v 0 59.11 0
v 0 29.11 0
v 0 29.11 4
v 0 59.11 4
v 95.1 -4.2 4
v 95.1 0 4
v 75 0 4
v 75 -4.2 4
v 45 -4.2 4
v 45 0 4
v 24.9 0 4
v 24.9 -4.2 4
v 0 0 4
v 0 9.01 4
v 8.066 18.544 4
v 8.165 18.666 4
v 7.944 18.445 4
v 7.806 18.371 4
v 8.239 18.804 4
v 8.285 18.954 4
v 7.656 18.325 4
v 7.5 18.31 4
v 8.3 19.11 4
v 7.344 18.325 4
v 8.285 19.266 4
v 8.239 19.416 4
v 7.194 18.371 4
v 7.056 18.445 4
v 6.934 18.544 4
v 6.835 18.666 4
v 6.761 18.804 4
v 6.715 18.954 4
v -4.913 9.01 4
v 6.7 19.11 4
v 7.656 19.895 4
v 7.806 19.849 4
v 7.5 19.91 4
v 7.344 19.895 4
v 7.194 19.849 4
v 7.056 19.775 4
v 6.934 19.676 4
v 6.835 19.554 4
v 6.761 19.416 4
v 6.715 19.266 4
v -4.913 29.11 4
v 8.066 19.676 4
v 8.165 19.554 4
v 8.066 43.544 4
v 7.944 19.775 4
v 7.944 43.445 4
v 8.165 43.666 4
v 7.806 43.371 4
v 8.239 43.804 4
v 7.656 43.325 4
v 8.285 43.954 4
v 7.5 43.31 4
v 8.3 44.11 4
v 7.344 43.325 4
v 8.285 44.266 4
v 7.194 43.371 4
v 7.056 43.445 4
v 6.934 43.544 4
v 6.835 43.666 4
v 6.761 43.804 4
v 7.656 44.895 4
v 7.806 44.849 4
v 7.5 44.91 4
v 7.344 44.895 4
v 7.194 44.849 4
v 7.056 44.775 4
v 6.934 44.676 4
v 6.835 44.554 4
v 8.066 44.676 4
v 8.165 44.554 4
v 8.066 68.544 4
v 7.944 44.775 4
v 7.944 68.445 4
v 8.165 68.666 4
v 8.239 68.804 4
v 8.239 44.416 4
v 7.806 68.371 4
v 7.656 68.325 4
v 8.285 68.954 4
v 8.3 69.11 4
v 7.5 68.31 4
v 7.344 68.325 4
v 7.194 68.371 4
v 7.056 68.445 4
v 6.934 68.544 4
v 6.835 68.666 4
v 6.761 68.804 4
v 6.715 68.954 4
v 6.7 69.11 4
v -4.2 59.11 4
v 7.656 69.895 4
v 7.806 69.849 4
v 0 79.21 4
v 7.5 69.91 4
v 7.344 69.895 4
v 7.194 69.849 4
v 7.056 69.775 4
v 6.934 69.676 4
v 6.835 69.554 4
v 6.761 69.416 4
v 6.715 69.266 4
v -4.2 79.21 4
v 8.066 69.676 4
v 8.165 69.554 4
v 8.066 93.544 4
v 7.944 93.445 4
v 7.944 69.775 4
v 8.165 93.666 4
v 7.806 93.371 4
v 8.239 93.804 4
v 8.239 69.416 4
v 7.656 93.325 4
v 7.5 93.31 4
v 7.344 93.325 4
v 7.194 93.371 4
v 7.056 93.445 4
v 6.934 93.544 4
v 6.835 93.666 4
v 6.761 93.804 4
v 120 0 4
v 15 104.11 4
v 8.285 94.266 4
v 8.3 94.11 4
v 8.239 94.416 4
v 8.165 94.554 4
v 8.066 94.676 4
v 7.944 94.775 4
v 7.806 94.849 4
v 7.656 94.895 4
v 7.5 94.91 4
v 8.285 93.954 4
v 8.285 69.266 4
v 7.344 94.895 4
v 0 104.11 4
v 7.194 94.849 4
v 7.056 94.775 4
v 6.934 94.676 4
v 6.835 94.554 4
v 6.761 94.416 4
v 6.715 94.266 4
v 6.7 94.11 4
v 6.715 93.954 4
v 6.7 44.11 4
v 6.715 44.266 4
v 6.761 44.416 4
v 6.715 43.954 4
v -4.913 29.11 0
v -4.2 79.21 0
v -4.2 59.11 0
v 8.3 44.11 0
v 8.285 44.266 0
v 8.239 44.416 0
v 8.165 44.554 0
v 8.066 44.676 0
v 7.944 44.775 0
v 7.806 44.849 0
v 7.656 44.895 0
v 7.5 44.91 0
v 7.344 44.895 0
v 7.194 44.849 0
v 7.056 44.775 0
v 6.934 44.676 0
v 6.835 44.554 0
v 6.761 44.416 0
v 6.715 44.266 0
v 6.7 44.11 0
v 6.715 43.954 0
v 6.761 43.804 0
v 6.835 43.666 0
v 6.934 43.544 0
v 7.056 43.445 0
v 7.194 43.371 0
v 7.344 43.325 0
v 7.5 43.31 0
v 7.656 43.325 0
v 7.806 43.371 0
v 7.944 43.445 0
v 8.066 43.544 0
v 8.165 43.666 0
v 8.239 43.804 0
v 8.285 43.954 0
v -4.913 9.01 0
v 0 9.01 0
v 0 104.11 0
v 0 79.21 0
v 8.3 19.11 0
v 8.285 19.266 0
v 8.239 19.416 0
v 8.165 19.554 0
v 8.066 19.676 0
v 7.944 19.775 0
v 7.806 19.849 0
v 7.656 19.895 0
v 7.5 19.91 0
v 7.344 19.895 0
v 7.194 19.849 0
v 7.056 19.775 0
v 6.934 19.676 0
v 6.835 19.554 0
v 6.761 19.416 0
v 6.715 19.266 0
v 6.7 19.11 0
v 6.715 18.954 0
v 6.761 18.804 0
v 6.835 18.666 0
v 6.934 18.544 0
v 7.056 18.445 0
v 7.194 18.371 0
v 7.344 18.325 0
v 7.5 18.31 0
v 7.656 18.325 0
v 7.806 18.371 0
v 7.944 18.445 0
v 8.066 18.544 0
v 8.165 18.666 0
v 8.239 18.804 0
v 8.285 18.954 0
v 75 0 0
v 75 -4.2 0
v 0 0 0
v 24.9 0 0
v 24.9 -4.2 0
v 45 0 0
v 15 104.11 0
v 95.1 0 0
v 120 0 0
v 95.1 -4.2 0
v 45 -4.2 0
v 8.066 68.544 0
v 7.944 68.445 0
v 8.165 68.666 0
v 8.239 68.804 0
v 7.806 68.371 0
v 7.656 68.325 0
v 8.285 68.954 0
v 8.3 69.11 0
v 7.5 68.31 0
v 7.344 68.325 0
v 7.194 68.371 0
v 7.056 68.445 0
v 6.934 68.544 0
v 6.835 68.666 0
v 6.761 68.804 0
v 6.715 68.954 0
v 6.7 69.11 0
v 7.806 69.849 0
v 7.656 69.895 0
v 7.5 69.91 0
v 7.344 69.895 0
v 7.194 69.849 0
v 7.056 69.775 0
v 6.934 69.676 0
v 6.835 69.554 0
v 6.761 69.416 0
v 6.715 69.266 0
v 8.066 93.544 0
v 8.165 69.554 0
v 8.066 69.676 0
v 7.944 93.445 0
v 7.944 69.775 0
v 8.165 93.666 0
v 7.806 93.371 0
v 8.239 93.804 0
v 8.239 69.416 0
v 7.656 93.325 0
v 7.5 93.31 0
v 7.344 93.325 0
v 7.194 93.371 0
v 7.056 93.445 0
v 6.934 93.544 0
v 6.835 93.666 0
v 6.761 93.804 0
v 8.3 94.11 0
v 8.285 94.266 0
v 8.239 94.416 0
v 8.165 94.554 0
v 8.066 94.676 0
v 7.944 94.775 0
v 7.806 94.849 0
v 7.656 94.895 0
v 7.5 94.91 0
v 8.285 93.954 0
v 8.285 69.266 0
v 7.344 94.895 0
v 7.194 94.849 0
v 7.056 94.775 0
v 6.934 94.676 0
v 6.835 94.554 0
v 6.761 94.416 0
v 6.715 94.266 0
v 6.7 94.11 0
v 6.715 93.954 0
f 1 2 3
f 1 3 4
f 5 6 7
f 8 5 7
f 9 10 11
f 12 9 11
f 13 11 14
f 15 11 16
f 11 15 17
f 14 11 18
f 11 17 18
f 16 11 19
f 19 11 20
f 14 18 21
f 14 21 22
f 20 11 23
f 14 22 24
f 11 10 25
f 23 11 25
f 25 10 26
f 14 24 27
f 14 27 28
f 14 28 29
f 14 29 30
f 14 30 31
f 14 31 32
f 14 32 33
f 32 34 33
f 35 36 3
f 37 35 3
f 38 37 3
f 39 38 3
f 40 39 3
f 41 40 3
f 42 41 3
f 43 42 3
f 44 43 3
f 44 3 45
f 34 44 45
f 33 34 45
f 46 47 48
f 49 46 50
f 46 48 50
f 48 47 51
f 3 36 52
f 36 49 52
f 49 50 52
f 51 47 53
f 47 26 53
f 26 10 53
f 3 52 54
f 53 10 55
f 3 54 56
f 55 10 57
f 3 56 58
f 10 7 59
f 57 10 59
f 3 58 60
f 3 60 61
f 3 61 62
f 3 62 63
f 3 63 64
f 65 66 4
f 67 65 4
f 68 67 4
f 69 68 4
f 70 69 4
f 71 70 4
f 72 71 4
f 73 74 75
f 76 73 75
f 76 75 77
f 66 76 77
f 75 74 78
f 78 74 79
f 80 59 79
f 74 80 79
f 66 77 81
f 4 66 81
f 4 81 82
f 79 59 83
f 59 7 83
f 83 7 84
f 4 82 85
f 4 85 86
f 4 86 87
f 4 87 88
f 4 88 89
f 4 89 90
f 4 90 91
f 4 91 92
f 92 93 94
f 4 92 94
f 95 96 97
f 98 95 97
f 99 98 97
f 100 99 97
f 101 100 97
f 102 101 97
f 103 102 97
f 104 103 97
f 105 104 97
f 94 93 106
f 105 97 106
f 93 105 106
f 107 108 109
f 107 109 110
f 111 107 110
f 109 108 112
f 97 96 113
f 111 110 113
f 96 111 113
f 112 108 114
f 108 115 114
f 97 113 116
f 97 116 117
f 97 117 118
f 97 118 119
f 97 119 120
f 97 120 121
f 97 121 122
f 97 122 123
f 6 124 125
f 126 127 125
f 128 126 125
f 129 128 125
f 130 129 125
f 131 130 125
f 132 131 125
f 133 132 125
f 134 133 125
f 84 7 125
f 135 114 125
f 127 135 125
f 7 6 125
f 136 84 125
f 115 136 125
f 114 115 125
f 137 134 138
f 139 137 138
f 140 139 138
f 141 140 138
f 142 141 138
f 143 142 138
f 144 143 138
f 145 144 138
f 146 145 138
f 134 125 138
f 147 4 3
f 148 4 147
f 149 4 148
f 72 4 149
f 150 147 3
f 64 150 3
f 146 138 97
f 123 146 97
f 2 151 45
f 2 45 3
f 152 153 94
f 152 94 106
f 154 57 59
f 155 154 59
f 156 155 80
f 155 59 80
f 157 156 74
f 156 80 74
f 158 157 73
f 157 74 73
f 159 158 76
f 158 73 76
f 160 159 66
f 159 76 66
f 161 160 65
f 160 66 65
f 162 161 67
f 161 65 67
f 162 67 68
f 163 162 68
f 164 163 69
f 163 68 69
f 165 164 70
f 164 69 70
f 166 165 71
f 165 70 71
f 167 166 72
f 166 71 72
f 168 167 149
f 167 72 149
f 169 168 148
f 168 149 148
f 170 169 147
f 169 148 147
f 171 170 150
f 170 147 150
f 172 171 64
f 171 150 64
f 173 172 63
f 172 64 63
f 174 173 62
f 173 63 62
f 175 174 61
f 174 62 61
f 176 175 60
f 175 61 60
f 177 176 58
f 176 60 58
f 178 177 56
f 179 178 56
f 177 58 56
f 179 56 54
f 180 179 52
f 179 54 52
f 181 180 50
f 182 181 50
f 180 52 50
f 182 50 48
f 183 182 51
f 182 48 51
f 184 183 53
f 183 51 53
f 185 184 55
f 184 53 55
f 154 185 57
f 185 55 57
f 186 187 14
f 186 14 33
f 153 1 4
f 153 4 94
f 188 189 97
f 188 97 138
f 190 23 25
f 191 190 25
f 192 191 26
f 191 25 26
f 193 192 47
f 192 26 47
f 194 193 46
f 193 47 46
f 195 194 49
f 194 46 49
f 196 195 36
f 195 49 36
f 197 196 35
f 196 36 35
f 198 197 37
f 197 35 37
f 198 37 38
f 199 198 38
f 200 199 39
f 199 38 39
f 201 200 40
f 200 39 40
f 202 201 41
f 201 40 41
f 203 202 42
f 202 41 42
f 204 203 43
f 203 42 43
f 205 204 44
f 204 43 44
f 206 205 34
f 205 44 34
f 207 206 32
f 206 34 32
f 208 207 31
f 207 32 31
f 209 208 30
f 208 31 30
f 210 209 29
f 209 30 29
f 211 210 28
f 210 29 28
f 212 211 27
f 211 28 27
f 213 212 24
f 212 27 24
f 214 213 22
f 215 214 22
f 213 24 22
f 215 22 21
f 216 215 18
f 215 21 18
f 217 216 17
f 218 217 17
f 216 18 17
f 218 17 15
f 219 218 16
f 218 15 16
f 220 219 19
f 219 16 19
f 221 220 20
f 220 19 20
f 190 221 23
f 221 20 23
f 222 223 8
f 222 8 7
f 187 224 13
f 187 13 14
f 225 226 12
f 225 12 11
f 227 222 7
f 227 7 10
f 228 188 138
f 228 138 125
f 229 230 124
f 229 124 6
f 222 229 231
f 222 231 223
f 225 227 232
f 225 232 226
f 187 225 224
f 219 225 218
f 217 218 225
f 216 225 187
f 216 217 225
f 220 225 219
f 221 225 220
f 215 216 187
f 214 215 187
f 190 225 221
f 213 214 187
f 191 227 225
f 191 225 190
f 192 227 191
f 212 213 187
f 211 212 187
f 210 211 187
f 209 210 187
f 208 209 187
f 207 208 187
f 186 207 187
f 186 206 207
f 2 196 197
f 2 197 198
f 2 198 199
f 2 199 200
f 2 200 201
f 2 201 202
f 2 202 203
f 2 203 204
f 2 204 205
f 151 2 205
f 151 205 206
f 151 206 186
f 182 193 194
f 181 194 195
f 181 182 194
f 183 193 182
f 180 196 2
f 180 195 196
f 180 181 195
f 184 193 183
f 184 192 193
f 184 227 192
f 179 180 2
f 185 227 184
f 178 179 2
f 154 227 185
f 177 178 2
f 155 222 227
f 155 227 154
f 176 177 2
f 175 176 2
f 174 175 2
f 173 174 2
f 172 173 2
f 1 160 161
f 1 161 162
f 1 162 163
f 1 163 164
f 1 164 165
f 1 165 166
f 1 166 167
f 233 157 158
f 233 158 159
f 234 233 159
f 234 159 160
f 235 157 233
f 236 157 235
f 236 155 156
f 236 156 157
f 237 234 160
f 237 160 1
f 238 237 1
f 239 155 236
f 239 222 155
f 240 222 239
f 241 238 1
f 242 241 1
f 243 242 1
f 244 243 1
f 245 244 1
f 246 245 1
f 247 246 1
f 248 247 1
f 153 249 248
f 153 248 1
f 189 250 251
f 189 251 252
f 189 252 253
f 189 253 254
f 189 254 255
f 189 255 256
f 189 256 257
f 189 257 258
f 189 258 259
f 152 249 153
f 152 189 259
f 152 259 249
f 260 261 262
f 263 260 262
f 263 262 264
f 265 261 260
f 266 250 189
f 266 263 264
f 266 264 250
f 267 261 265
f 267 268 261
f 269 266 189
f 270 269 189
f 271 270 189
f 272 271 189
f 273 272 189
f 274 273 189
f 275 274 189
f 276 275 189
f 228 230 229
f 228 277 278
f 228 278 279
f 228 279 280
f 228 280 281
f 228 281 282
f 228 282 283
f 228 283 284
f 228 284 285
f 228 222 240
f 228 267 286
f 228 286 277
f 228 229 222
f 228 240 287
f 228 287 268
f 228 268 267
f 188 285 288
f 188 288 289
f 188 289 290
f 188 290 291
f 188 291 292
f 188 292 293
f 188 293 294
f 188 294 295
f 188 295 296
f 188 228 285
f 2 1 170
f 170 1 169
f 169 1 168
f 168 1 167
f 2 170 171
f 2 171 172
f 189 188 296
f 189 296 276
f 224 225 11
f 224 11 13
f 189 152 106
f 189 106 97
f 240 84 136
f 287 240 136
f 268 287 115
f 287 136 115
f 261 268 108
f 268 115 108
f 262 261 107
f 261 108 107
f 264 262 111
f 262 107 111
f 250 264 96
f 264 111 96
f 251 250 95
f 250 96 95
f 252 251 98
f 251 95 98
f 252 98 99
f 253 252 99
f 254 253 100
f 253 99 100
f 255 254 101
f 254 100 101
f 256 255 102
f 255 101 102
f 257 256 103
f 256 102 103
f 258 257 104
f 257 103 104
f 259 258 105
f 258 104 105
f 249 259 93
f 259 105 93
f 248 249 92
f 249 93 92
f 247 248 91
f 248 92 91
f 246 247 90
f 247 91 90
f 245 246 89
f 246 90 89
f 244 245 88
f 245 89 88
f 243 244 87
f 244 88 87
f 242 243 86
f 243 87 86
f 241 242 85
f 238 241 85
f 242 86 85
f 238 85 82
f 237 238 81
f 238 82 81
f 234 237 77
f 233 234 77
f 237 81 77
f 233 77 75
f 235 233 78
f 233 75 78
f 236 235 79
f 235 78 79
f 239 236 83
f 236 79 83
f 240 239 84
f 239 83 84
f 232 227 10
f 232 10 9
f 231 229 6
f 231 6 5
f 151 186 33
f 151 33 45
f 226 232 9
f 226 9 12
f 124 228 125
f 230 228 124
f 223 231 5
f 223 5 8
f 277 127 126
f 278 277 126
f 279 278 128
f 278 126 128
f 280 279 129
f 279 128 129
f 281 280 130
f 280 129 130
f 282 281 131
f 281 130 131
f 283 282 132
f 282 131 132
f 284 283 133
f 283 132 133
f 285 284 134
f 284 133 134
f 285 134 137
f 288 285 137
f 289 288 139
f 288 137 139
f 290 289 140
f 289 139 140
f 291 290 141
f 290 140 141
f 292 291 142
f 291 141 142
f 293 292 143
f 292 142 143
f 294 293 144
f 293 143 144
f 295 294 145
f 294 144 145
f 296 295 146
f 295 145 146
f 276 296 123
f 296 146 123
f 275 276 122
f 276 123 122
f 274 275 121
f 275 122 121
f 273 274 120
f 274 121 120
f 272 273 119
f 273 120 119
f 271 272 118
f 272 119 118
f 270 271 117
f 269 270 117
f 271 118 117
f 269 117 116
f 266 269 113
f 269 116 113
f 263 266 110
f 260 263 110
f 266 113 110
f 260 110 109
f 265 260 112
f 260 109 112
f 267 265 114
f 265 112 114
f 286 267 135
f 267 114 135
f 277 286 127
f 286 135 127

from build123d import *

# Parameters (mm, degrees)
BOSS_EXTRUDE1_DEPTH = 4
SKETCH2_R           = 0.8
CUT_EXTRUDE1_DEPTH  = 4
LPATTERN1_COUNT     = 4
LPATTERN1_PITCH     = 25


with BuildPart() as part:
    # Sketch1 → Boss-Extrude1 (new body)
    with BuildSketch(Plane.XY):
        Polygon((0, 0), (0, 9.01), (-4.913167973, 9.01), (-4.913167973, 29.11), (0, 29.11), (0, 59.11), (-4.2, 59.11), (-4.2, 79.21), (0, 79.21), (0, 104.11), (15, 104.11), (120, 0), (95.1, 0), (95.1, -4.2), (75, -4.2), (75, 0), (45, 0), (45, -4.2), (24.9, -4.2), (24.9, 0), align=None)
    extrude(amount=BOSS_EXTRUDE1_DEPTH)

    # Sketch2 → Cut-Extrude1 (cut)
    with BuildSketch(Plane.XY.offset(4)):
        with Locations((7.5, 94.11)):
            Circle(SKETCH2_R)
    cut_extrude1 = extrude(amount=-CUT_EXTRUDE1_DEPTH, mode=Mode.SUBTRACT)

    # LPattern1: Cut-Extrude1 ×4
    with Locations(*[(0, -i * LPATTERN1_PITCH, 0) for i in range(1, LPATTERN1_COUNT)]):
        add(cut_extrude1, mode=Mode.SUBTRACT)


solid = part.part
